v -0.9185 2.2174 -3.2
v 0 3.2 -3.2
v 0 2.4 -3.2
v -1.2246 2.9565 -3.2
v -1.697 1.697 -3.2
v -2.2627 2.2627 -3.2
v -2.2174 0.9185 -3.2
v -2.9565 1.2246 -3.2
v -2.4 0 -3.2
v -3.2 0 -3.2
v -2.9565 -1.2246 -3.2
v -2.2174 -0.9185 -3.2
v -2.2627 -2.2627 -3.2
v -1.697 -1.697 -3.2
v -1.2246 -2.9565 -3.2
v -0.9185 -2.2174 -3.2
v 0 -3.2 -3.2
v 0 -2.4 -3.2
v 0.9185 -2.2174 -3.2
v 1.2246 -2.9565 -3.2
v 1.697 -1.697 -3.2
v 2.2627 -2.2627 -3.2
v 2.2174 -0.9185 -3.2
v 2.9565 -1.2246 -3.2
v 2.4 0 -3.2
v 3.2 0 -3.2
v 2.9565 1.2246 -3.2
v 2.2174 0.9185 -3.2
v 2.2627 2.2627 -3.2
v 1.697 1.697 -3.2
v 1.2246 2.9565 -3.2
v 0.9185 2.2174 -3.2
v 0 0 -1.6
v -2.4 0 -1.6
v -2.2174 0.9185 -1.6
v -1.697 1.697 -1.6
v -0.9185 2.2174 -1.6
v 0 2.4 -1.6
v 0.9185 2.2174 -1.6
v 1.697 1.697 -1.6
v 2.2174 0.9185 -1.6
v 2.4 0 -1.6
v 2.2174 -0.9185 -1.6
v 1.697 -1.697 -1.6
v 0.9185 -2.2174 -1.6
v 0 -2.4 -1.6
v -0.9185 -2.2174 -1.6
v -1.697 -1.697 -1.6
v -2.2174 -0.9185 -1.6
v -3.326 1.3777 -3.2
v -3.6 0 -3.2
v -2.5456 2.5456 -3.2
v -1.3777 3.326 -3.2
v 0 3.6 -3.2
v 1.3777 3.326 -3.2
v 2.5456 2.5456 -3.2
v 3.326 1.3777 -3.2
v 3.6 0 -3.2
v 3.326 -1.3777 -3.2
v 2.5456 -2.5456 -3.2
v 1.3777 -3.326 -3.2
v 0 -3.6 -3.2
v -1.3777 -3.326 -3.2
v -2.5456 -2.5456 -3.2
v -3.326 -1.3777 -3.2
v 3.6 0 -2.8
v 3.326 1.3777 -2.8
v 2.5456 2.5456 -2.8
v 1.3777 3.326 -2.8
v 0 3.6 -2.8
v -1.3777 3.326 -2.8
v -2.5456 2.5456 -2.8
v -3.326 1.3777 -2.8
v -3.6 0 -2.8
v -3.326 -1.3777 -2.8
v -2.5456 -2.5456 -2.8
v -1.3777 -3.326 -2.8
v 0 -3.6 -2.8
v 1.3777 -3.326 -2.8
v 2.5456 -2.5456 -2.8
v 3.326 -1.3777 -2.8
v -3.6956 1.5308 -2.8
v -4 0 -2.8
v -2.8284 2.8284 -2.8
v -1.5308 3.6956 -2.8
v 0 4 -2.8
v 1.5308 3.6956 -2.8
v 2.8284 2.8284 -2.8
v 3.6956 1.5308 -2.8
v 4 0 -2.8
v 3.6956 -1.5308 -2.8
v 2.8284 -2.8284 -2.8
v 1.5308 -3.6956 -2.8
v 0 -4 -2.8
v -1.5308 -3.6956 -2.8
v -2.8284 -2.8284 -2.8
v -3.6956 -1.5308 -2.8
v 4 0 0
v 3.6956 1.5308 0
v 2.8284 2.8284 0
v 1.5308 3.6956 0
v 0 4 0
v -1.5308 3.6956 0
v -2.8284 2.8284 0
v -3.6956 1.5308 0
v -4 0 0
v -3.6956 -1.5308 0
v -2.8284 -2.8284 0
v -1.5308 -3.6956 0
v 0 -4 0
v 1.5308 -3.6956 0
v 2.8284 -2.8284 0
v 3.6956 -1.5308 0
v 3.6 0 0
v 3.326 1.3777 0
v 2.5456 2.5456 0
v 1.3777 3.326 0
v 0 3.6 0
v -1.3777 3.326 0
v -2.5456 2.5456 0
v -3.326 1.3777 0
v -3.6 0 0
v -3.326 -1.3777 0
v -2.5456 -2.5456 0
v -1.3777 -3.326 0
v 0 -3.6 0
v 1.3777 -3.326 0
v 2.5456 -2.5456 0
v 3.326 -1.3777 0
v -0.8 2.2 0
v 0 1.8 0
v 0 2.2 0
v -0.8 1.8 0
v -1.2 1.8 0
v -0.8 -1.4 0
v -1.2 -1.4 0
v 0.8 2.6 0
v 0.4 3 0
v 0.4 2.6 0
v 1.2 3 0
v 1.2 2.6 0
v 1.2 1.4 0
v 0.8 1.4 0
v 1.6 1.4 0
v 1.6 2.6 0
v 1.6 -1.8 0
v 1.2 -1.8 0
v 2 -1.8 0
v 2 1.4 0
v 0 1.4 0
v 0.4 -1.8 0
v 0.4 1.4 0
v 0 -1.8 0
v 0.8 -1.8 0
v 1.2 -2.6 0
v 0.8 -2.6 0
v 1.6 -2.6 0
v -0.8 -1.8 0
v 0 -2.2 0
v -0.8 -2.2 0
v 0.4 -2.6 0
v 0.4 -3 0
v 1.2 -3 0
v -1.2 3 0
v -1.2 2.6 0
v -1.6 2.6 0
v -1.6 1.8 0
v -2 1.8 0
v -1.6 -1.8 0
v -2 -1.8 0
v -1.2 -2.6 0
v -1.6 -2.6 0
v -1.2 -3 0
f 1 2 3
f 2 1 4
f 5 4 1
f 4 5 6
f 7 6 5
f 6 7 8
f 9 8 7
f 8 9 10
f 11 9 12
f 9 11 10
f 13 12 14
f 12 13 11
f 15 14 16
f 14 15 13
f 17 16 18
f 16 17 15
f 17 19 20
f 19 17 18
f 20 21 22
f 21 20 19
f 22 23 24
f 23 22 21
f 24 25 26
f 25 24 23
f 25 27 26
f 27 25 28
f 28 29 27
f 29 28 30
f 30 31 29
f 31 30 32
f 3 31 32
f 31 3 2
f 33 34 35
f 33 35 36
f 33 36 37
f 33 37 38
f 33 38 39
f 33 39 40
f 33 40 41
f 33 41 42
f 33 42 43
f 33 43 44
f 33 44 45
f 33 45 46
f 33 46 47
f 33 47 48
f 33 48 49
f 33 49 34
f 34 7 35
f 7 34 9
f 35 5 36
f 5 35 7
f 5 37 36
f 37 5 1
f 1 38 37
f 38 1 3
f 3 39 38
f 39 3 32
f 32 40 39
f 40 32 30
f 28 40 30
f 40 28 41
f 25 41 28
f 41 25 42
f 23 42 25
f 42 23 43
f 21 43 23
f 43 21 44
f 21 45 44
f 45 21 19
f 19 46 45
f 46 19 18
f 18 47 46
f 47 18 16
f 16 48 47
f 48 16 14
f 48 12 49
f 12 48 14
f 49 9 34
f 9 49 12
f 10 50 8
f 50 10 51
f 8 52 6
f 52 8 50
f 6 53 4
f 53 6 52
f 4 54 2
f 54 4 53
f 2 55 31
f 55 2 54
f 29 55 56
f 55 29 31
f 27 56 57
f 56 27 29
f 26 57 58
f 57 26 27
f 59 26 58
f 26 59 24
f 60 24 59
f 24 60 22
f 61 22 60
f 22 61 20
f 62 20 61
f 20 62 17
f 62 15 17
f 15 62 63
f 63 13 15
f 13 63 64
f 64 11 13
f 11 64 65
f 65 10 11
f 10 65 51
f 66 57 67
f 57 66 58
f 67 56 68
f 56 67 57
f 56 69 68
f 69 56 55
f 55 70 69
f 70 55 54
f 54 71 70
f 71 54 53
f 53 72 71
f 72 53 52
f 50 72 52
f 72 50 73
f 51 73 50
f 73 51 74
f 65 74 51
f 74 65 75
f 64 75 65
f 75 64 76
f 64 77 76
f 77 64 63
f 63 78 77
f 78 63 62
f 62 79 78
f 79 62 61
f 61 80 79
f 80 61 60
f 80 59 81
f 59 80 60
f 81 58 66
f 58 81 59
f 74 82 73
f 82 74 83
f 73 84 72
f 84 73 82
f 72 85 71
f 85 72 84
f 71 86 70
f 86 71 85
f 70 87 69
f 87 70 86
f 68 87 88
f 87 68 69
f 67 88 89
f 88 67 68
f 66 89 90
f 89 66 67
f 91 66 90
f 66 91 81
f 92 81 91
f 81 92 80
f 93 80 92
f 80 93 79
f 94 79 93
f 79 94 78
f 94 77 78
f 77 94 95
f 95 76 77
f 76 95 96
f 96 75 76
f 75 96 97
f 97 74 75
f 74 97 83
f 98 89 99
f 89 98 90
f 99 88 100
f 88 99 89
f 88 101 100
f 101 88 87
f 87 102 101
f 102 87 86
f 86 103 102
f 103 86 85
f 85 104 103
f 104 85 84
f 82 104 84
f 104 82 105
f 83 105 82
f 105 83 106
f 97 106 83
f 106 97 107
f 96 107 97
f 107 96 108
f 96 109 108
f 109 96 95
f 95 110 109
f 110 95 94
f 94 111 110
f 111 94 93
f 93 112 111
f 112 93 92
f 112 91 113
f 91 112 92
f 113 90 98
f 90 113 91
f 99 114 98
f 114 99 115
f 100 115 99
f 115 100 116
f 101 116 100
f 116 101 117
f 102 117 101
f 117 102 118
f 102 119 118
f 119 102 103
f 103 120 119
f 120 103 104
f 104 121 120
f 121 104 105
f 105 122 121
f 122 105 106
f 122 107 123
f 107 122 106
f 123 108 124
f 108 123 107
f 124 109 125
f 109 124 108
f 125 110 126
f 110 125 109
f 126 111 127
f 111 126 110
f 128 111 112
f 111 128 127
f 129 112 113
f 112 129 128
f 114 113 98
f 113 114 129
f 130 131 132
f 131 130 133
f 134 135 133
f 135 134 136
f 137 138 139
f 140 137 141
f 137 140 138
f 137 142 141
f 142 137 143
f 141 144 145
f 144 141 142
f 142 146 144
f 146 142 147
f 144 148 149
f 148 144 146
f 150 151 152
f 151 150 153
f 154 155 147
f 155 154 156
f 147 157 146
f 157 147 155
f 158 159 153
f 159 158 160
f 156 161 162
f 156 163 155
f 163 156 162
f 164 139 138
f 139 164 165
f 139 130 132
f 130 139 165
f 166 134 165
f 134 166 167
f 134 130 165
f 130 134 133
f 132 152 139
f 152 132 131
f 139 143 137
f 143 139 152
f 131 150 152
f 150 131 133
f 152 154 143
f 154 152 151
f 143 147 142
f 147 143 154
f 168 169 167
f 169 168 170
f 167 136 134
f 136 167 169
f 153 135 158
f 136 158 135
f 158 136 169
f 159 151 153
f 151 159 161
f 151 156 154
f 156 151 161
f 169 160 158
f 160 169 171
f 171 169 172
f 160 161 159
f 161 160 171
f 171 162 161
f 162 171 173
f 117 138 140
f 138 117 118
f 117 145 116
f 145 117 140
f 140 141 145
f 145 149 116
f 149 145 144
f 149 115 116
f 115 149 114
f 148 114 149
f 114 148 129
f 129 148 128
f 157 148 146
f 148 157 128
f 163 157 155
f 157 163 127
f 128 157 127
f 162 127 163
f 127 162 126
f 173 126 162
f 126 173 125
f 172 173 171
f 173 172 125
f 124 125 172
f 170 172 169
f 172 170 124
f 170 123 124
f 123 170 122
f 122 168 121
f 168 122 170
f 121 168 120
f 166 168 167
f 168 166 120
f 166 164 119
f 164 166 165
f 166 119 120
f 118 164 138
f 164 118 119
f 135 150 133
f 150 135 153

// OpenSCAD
// file: ../p/4-4disc.scad
use <../lib.scad>
function ldraw_lib__4_4disc() = [
// 0 Disc 1.0
// 0 Name: 4-4disc.dat
// 0 Author: James Jessiman
// 0 !LDRAW_ORG Primitive UPDATE 2002-02
// 0 !LICENSE Licensed under CC BY 4.0 : see CAreadme.txt
// 
// 0 BFC CERTIFY CCW
  [0,"BFC","CERTIFY"],
  [0,"BFC","CCW"],
// 
// 0 !HISTORY 1998-12-15 [PTadmin] Official Update 1998-10
// 0 !HISTORY 2002-03-23 [sbliss] Added BFC statement
// 0 !HISTORY 2002-04-25 [PTadmin] Official Update 2002-02
// 0 !HISTORY 2007-06-24 [PTadmin] Header formatted for Contributor Agreement
// 0 !HISTORY 2008-07-01 [PTadmin] Official Update 2008-01
// 
// 
// 3 16 0 0 0 1 0 0 0.9239 0 0.3827
  [3,16,0,0,0,1,0,0,0.9239,0,0.3827],
// 3 16 0 0 0 0.9239 0 0.3827 0.7071 0 0.7071
  [3,16,0,0,0,0.9239,0,0.3827,0.7071,0,0.7071],
// 3 16 0 0 0 0.7071 0 0.7071 0.3827 0 0.9239
  [3,16,0,0,0,0.7071,0,0.7071,0.3827,0,0.9239],
// 3 16 0 0 0 0.3827 0 0.9239 0 0 1
  [3,16,0,0,0,0.3827,0,0.9239,0,0,1],
// 3 16 0 0 0 0 0 1 -0.3827 0 0.9239
  [3,16,0,0,0,0,0,1,-0.3827,0,0.9239],
// 3 16 0 0 0 -0.3827 0 0.9239 -0.7071 0 0.7071
  [3,16,0,0,0,-0.3827,0,0.9239,-0.7071,0,0.7071],
// 3 16 0 0 0 -0.7071 0 0.7071 -0.9239 0 0.3827
  [3,16,0,0,0,-0.7071,0,0.7071,-0.9239,0,0.3827],
// 3 16 0 0 0 -0.9239 0 0.3827 -1 0 -0
  [3,16,0,0,0,-0.9239,0,0.3827,-1,0,-0],
// 3 16 0 0 0 -1 0 -0 -0.9239 0 -0.3827
  [3,16,0,0,0,-1,0,-0,-0.9239,0,-0.3827],
// 3 16 0 0 0 -0.9239 0 -0.3827 -0.7071 0 -0.7071
  [3,16,0,0,0,-0.9239,0,-0.3827,-0.7071,0,-0.7071],
// 3 16 0 0 0 -0.7071 0 -0.7071 -0.3827 0 -0.9239
  [3,16,0,0,0,-0.7071,0,-0.7071,-0.3827,0,-0.9239],
// 3 16 0 0 0 -0.3827 0 -0.9239 0 0 -1
  [3,16,0,0,0,-0.3827,0,-0.9239,0,0,-1],
// 3 16 0 0 0 0 0 -1 0.3827 0 -0.9239
  [3,16,0,0,0,0,0,-1,0.3827,0,-0.9239],
// 3 16 0 0 0 0.3827 0 -0.9239 0.7071 0 -0.7071
  [3,16,0,0,0,0.3827,0,-0.9239,0.7071,0,-0.7071],
// 3 16 0 0 0 0.7071 0 -0.7071 0.9239 0 -0.3827
  [3,16,0,0,0,0.7071,0,-0.7071,0.9239,0,-0.3827],
// 3 16 0 0 0 0.9239 0 -0.3827 1 0 0
  [3,16,0,0,0,0.9239,0,-0.3827,1,0,0],
// 0
];
module ldraw_lib__4_4disc(step=0, col=false, unit=2/5, alt=false, line=0.2, solid=!$preview)
    makepoly(ldraw_lib__4_4disc(), step=step, col=col, unit=unit, alt=alt, line=line, solid=solid);
ldraw_lib__4_4disc(line=0.2);
// file: ../p/4-4ring3.scad
use <../lib.scad>
function ldraw_lib__4_4ring3() = [
// 0 Ring  3 x 1.0
// 0 Name: 4-4ring3.dat
// 0 Author: James Jessiman
// 0 !LDRAW_ORG Primitive UPDATE 2009-01
// 0 !LICENSE Licensed under CC BY 4.0 : see CAreadme.txt
// 
// 0 BFC CERTIFY CCW
  [0,"BFC","CERTIFY"],
  [0,"BFC","CCW"],
// 
// 0 !HISTORY 1998-12-15 [PTadmin] Official Update 1998-10
// 0 !HISTORY 2002-04-05 [hafhead] Added BFC statement
// 0 !HISTORY 2002-04-25 [PTadmin] Official Update 2002-02
// 0 !HISTORY 2007-06-24 [PTadmin] Header formatted for Contributor Agreement
// 0 !HISTORY 2008-07-01 [PTadmin] Official Update 2008-01
// 0 !HISTORY 2008-08-26 [cwdee] Switch polygon winding and rename
// 0 !HISTORY 2009-05-02 [PTadmin] Official Update 2009-01
// 
// 
// 4 16 -1.5308 0 3.6956 -1.1481 0 2.7717 0 0 3 0 0 4
  [4,16,-1.5308,0,3.6956,-1.1481,0,2.7717,0,0,3,0,0,4],
// 4 16 -2.8284 0 2.8284 -2.1213 0 2.1213 -1.1481 0 2.7717 -1.5308 0 3.6956
  [4,16,-2.8284,0,2.8284,-2.1213,0,2.1213,-1.1481,0,2.7717,-1.5308,0,3.6956],
// 4 16 -3.6956 0 1.5308 -2.7717 0 1.1481 -2.1213 0 2.1213 -2.8284 0 2.8284
  [4,16,-3.6956,0,1.5308,-2.7717,0,1.1481,-2.1213,0,2.1213,-2.8284,0,2.8284],
// 4 16 -4 0 0 -3 0 0 -2.7717 0 1.1481 -3.6956 0 1.5308
  [4,16,-4,0,0,-3,0,0,-2.7717,0,1.1481,-3.6956,0,1.5308],
// 4 16 -3.6956 0 -1.5308 -2.7717 0 -1.1481 -3 0 0 -4 0 0
  [4,16,-3.6956,0,-1.5308,-2.7717,0,-1.1481,-3,0,0,-4,0,0],
// 4 16 -2.8284 0 -2.8284 -2.1213 0 -2.1213 -2.7717 0 -1.1481 -3.6956 0 -1.5308
  [4,16,-2.8284,0,-2.8284,-2.1213,0,-2.1213,-2.7717,0,-1.1481,-3.6956,0,-1.5308],
// 4 16 -1.5308 0 -3.6956 -1.1481 0 -2.7717 -2.1213 0 -2.1213 -2.8284 0 -2.8284
  [4,16,-1.5308,0,-3.6956,-1.1481,0,-2.7717,-2.1213,0,-2.1213,-2.8284,0,-2.8284],
// 4 16 0 0 -4 0 0 -3 -1.1481 0 -2.7717 -1.5308 0 -3.6956
  [4,16,0,0,-4,0,0,-3,-1.1481,0,-2.7717,-1.5308,0,-3.6956],
// 4 16 1.5308 0 -3.6956 1.1481 0 -2.7717 0 0 -3 0 0 -4
  [4,16,1.5308,0,-3.6956,1.1481,0,-2.7717,0,0,-3,0,0,-4],
// 4 16 2.8284 0 -2.8284 2.1213 0 -2.1213 1.1481 0 -2.7717 1.5308 0 -3.6956
  [4,16,2.8284,0,-2.8284,2.1213,0,-2.1213,1.1481,0,-2.7717,1.5308,0,-3.6956],
// 4 16 3.6956 0 -1.5308 2.7717 0 -1.1481 2.1213 0 -2.1213 2.8284 0 -2.8284
  [4,16,3.6956,0,-1.5308,2.7717,0,-1.1481,2.1213,0,-2.1213,2.8284,0,-2.8284],
// 4 16 4 0 0 3 0 0 2.7717 0 -1.1481 3.6956 0 -1.5308
  [4,16,4,0,0,3,0,0,2.7717,0,-1.1481,3.6956,0,-1.5308],
// 4 16 3.6956 0 1.5308 2.7717 0 1.1481 3 0 0 4 0 0
  [4,16,3.6956,0,1.5308,2.7717,0,1.1481,3,0,0,4,0,0],
// 4 16 2.8284 0 2.8284 2.1213 0 2.1213 2.7717 0 1.1481 3.6956 0 1.5308
  [4,16,2.8284,0,2.8284,2.1213,0,2.1213,2.7717,0,1.1481,3.6956,0,1.5308],
// 4 16 1.5308 0 3.6956 1.1481 0 2.7717 2.1213 0 2.1213 2.8284 0 2.8284
  [4,16,1.5308,0,3.6956,1.1481,0,2.7717,2.1213,0,2.1213,2.8284,0,2.8284],
// 4 16 0 0 4 0 0 3 1.1481 0 2.7717 1.5308 0 3.6956
  [4,16,0,0,4,0,0,3,1.1481,0,2.7717,1.5308,0,3.6956],
// 0
];
module ldraw_lib__4_4ring3(step=0, col=false, unit=2/5, alt=false, line=0.2, solid=!$preview)
    makepoly(ldraw_lib__4_4ring3(), step=step, col=col, unit=unit, alt=alt, line=line, solid=solid);
ldraw_lib__4_4ring3(line=0.2);
// file: ../p/4-4cylc.scad
use <../lib.scad>
use <4-4cyli.scad>
use <4-4disc.scad>
use <4-4edge.scad>
function ldraw_lib__4_4cylc() = [
// 0 Cylinder Closed 1.0
// 0 Name: 4-4cylc.dat
// 0 Author: Alex Taylor [anathema]
// 0 !LDRAW_ORG Primitive UPDATE 2009-02
// 0 !LICENSE Licensed under CC BY 4.0 : see CAreadme.txt
// 
// 0 BFC CERTIFY CCW
  [0,"BFC","CERTIFY"],
  [0,"BFC","CCW"],
// 
// 0 !HISTORY 2008-12-29 [cwdee] Removed one disc
// 0 !HISTORY 2009-09-03 [PTadmin] Official Update 2009-02
// 
// 
// 1 16 0 0 0 1 0 0 0 1 0 0 0 1 4-4edge.dat
  [1,16,0,0,0,1,0,0,0,1,0,0,0,1, ldraw_lib__4_4edge()],
// 1 16 0 1 0 1 0 0 0 1 0 0 0 1 4-4edge.dat
  [1,16,0,1,0,1,0,0,0,1,0,0,0,1, ldraw_lib__4_4edge()],
// 1 16 0 0 0 1 0 0 0 1 0 0 0 1 4-4disc.dat
  [1,16,0,0,0,1,0,0,0,1,0,0,0,1, ldraw_lib__4_4disc()],
// 1 16 0 0 0 1 0 0 0 1 0 0 0 1 4-4cyli.dat
  [1,16,0,0,0,1,0,0,0,1,0,0,0,1, ldraw_lib__4_4cyli()],
// 0
];
module ldraw_lib__4_4cylc(step=0, col=false, unit=2/5, alt=false, line=0.2, solid=!$preview)
    makepoly(ldraw_lib__4_4cylc(), step=step, col=col, unit=unit, alt=alt, line=line, solid=solid);
ldraw_lib__4_4cylc(line=0.2);
// file: ../p/4-4edge.scad
use <../lib.scad>
function ldraw_lib__4_4edge() = [
// 0 Circle 1.0
// 0 Name: 4-4edge.dat
// 0 Author: James Jessiman
// 0 !LDRAW_ORG Primitive UPDATE 2017-01
// 0 !LICENSE Licensed under CC BY 4.0 : see CAreadme.txt
// 
// 0 BFC CERTIFY CCW
  [0,"BFC","CERTIFY"],
  [0,"BFC","CCW"],
// 
// 0 !HISTORY 1998-12-15 [PTadmin] Official Update 1998-10
// 0 !HISTORY 2005-12-28 [PTadmin] Official Update 2005-01
// 0 !HISTORY 2007-06-24 [PTadmin] Header formatted for Contributor Agreement
// 0 !HISTORY 2008-07-01 [PTadmin] Official Update 2008-01
// 0 !HISTORY 2017-01-15 [Steffen] BFCed
// 0 !HISTORY 2017-12-30 [PTadmin] Official Update 2017-01
// 
// 
// 2 24 1 0 0 0.9239 0 0.3827
  [2,24,1,0,0,0.9239,0,0.3827],
// 2 24 0.9239 0 0.3827 0.7071 0 0.7071
  [2,24,0.9239,0,0.3827,0.7071,0,0.7071],
// 2 24 0.7071 0 0.7071 0.3827 0 0.9239
  [2,24,0.7071,0,0.7071,0.3827,0,0.9239],
// 2 24 0.3827 0 0.9239 0 0 1
  [2,24,0.3827,0,0.9239,0,0,1],
// 2 24 0 0 1 -0.3827 0 0.9239
  [2,24,0,0,1,-0.3827,0,0.9239],
// 2 24 -0.3827 0 0.9239 -0.7071 0 0.7071
  [2,24,-0.3827,0,0.9239,-0.7071,0,0.7071],
// 2 24 -0.7071 0 0.7071 -0.9239 0 0.3827
  [2,24,-0.7071,0,0.7071,-0.9239,0,0.3827],
// 2 24 -0.9239 0 0.3827 -1 0 -0
  [2,24,-0.9239,0,0.3827,-1,0,-0],
// 2 24 -1 0 -0 -0.9239 0 -0.3827
  [2,24,-1,0,-0,-0.9239,0,-0.3827],
// 2 24 -0.9239 0 -0.3827 -0.7071 0 -0.7071
  [2,24,-0.9239,0,-0.3827,-0.7071,0,-0.7071],
// 2 24 -0.7071 0 -0.7071 -0.3827 0 -0.9239
  [2,24,-0.7071,0,-0.7071,-0.3827,0,-0.9239],
// 2 24 -0.3827 0 -0.9239 0 0 -1
  [2,24,-0.3827,0,-0.9239,0,0,-1],
// 2 24 0 0 -1 0.3827 0 -0.9239
  [2,24,0,0,-1,0.3827,0,-0.9239],
// 2 24 0.3827 0 -0.9239 0.7071 0 -0.7071
  [2,24,0.3827,0,-0.9239,0.7071,0,-0.7071],
// 2 24 0.7071 0 -0.7071 0.9239 0 -0.3827
  [2,24,0.7071,0,-0.7071,0.9239,0,-0.3827],
// 2 24 0.9239 0 -0.3827 1 0 0
  [2,24,0.9239,0,-0.3827,1,0,0],
];
module ldraw_lib__4_4edge(step=0, col=false, unit=2/5, alt=false, line=0.2, solid=!$preview)
    makepoly(ldraw_lib__4_4edge(), step=step, col=col, unit=unit, alt=alt, line=line, solid=solid);
ldraw_lib__4_4edge(line=0.2);
// file: ../p/4-4cyli.scad
use <../lib.scad>
function ldraw_lib__4_4cyli() = [
// 0 Cylinder 1.0
// 0 Name: 4-4cyli.dat
// 0 Author: James Jessiman
// 0 !LDRAW_ORG Primitive UPDATE 2005-01
// 0 !LICENSE Licensed under CC BY 4.0 : see CAreadme.txt
// 
// 0 BFC CERTIFY CCW
  [0,"BFC","CERTIFY"],
  [0,"BFC","CCW"],
// 
// 0 !HISTORY 1998-12-15 [PTadmin] Official Update 1998-10
// 0 !HISTORY 2002-03-23 [sbliss] Added BFC statement; merged headers from files in distributions LDraw 0.27 and Complete.
// 0 !HISTORY 2002-04-25 [PTadmin] Official Update 2002-02
// 0 !HISTORY 2004-12-14 [guyvivan] BFC CCW
// 0 !HISTORY 2005-12-28 [PTadmin] Official Update 2005-01
// 0 !HISTORY 2007-06-24 [PTadmin] Header formatted for Contributor Agreement
// 0 !HISTORY 2008-07-01 [PTadmin] Official Update 2008-01
// 
// 
// 4 16 1 1 0 0.9239 1 0.3827 0.9239 0 0.3827 1 0 0
  [4,16,1,1,0,0.9239,1,0.3827,0.9239,0,0.3827,1,0,0],
// 5 24 1 0 0 1 1 0 0.9239 0 0.3827 0.9239 0 -0.3827
  [5,24,1,0,0,1,1,0,0.9239,0,0.3827,0.9239,0,-0.3827],
// 4 16 0.9239 1 0.3827 0.7071 1 0.7071 0.7071 0 0.7071 0.9239 0 0.3827
  [4,16,0.9239,1,0.3827,0.7071,1,0.7071,0.7071,0,0.7071,0.9239,0,0.3827],
// 5 24 0.9239 0 0.3827 0.9239 1 0.3827 0.7071 0 0.7071 1 0 0
  [5,24,0.9239,0,0.3827,0.9239,1,0.3827,0.7071,0,0.7071,1,0,0],
// 4 16 0.7071 1 0.7071 0.3827 1 0.9239 0.3827 0 0.9239 0.7071 0 0.7071
  [4,16,0.7071,1,0.7071,0.3827,1,0.9239,0.3827,0,0.9239,0.7071,0,0.7071],
// 5 24 0.7071 0 0.7071 0.7071 1 0.7071 0.3827 0 0.9239 0.9239 0 0.3827
  [5,24,0.7071,0,0.7071,0.7071,1,0.7071,0.3827,0,0.9239,0.9239,0,0.3827],
// 4 16 0.3827 1 0.9239 0 1 1 0 0 1 0.3827 0 0.9239
  [4,16,0.3827,1,0.9239,0,1,1,0,0,1,0.3827,0,0.9239],
// 5 24 0.3827 0 0.9239 0.3827 1 0.9239 0 0 1 0.7071 0 0.7071
  [5,24,0.3827,0,0.9239,0.3827,1,0.9239,0,0,1,0.7071,0,0.7071],
// 4 16 0 1 1 -0.3827 1 0.9239 -0.3827 0 0.9239 0 0 1
  [4,16,0,1,1,-0.3827,1,0.9239,-0.3827,0,0.9239,0,0,1],
// 5 24 0 0 1 0 1 1 -0.3827 0 0.9239 0.3827 0 0.9239
  [5,24,0,0,1,0,1,1,-0.3827,0,0.9239,0.3827,0,0.9239],
// 4 16 -0.3827 1 0.9239 -0.7071 1 0.7071 -0.7071 0 0.7071 -0.3827 0 0.9239
  [4,16,-0.3827,1,0.9239,-0.7071,1,0.7071,-0.7071,0,0.7071,-0.3827,0,0.9239],
// 5 24 -0.3827 0 0.9239 -0.3827 1 0.9239 -0.7071 0 0.7071 0 0 1
  [5,24,-0.3827,0,0.9239,-0.3827,1,0.9239,-0.7071,0,0.7071,0,0,1],
// 4 16 -0.7071 1 0.7071 -0.9239 1 0.3827 -0.9239 0 0.3827 -0.7071 0 0.7071
  [4,16,-0.7071,1,0.7071,-0.9239,1,0.3827,-0.9239,0,0.3827,-0.7071,0,0.7071],
// 5 24 -0.7071 0 0.7071 -0.7071 1 0.7071 -0.9239 0 0.3827 -0.3827 0 0.9239
  [5,24,-0.7071,0,0.7071,-0.7071,1,0.7071,-0.9239,0,0.3827,-0.3827,0,0.9239],
// 4 16 -0.9239 1 0.3827 -1 1 0 -1 0 0 -0.9239 0 0.3827
  [4,16,-0.9239,1,0.3827,-1,1,0,-1,0,0,-0.9239,0,0.3827],
// 5 24 -0.9239 0 0.3827 -0.9239 1 0.3827 -1 0 0 -0.7071 0 0.7071
  [5,24,-0.9239,0,0.3827,-0.9239,1,0.3827,-1,0,0,-0.7071,0,0.7071],
// 4 16 -1 1 0 -0.9239 1 -0.3827 -0.9239 0 -0.3827 -1 0 0
  [4,16,-1,1,0,-0.9239,1,-0.3827,-0.9239,0,-0.3827,-1,0,0],
// 5 24 -1 0 0 -1 1 0 -0.9239 0 -0.3827 -0.9239 0 0.3827
  [5,24,-1,0,0,-1,1,0,-0.9239,0,-0.3827,-0.9239,0,0.3827],
// 4 16 -0.9239 1 -0.3827 -0.7071 1 -0.7071 -0.7071 0 -0.7071 -0.9239 0 -0.3827
  [4,16,-0.9239,1,-0.3827,-0.7071,1,-0.7071,-0.7071,0,-0.7071,-0.9239,0,-0.3827],
// 5 24 -0.9239 0 -0.3827 -0.9239 1 -0.3827 -0.7071 0 -0.7071 -1 0 0
  [5,24,-0.9239,0,-0.3827,-0.9239,1,-0.3827,-0.7071,0,-0.7071,-1,0,0],
// 4 16 -0.7071 1 -0.7071 -0.3827 1 -0.9239 -0.3827 0 -0.9239 -0.7071 0 -0.7071
  [4,16,-0.7071,1,-0.7071,-0.3827,1,-0.9239,-0.3827,0,-0.9239,-0.7071,0,-0.7071],
// 5 24 -0.7071 0 -0.7071 -0.7071 1 -0.7071 -0.3827 0 -0.9239 -0.9239 0 -0.3827
  [5,24,-0.7071,0,-0.7071,-0.7071,1,-0.7071,-0.3827,0,-0.9239,-0.9239,0,-0.3827],
// 4 16 -0.3827 1 -0.9239 0 1 -1 0 0 -1 -0.3827 0 -0.9239
  [4,16,-0.3827,1,-0.9239,0,1,-1,0,0,-1,-0.3827,0,-0.9239],
// 5 24 -0.3827 0 -0.9239 -0.3827 1 -0.9239 0 0 -1 -0.7071 0 -0.7071
  [5,24,-0.3827,0,-0.9239,-0.3827,1,-0.9239,0,0,-1,-0.7071,0,-0.7071],
// 4 16 0 1 -1 0.3827 1 -0.9239 0.3827 0 -0.9239 0 0 -1
  [4,16,0,1,-1,0.3827,1,-0.9239,0.3827,0,-0.9239,0,0,-1],
// 5 24 0 0 -1 0 1 -1 0.3827 0 -0.9239 -0.3827 0 -0.9239
  [5,24,0,0,-1,0,1,-1,0.3827,0,-0.9239,-0.3827,0,-0.9239],
// 4 16 0.3827 1 -0.9239 0.7071 1 -0.7071 0.7071 0 -0.7071 0.3827 0 -0.9239
  [4,16,0.3827,1,-0.9239,0.7071,1,-0.7071,0.7071,0,-0.7071,0.3827,0,-0.9239],
// 5 24 0.3827 0 -0.9239 0.3827 1 -0.9239 0.7071 0 -0.7071 0 0 -1
  [5,24,0.3827,0,-0.9239,0.3827,1,-0.9239,0.7071,0,-0.7071,0,0,-1],
// 4 16 0.7071 1 -0.7071 0.9239 1 -0.3827 0.9239 0 -0.3827 0.7071 0 -0.7071
  [4,16,0.7071,1,-0.7071,0.9239,1,-0.3827,0.9239,0,-0.3827,0.7071,0,-0.7071],
// 5 24 0.7071 0 -0.7071 0.7071 1 -0.7071 0.9239 0 -0.3827 0.3827 0 -0.9239
  [5,24,0.7071,0,-0.7071,0.7071,1,-0.7071,0.9239,0,-0.3827,0.3827,0,-0.9239],
// 4 16 0.9239 1 -0.3827 1 1 0 1 0 0 0.9239 0 -0.3827
  [4,16,0.9239,1,-0.3827,1,1,0,1,0,0,0.9239,0,-0.3827],
// 5 24 0.9239 0 -0.3827 0.9239 1 -0.3827 1 0 0 0.7071 0 -0.7071
  [5,24,0.9239,0,-0.3827,0.9239,1,-0.3827,1,0,0,0.7071,0,-0.7071],
// 0
];
module ldraw_lib__4_4cyli(step=0, col=false, unit=2/5, alt=false, line=0.2, solid=!$preview)
    makepoly(ldraw_lib__4_4cyli(), step=step, col=col, unit=unit, alt=alt, line=line, solid=solid);
ldraw_lib__4_4cyli(line=0.2);
// file: ../p/stud4o.scad
use <../lib.scad>
use <4-4cylc.scad>
use <4-4ring3.scad>
function ldraw_lib__stud4o() = [
// 0 Stud Tube Open without Outer Cylinder
// 0 Name: stud4o.dat
// 0 Author: Magnus Forsberg [MagFors]
// 0 !LDRAW_ORG Primitive UPDATE 2011-02
// 0 !LICENSE Licensed under CC BY 4.0 : see CAreadme.txt
// 
// 0 !HELP This stud is a "antistud" to be used like a underside stud,
// 0 !HELP but without the outer cylinder.
// 0 !HELP 1 47 0 0 0 1 0 0 0 1 0 0 0 1 stud4.dat
// 
// 0 BFC CERTIFY CCW
  [0,"BFC","CERTIFY"],
  [0,"BFC","CCW"],
// 
// 0 !HISTORY 2011-12-29 [PTadmin] Official Update 2011-02
// 
// 
// 1 16 0 -4 0 2 0 0 0 1 0 0 0 2 4-4ring3.dat
  [1,16,0,-4,0,2,0,0,0,1,0,0,0,2, ldraw_lib__4_4ring3()],
// 0 BFC INVERTNEXT
  [0,"BFC","INVERTNEXT"],
// 1 16 0 0 0 -6 0 0 0 -4 0 0 0 6 4-4cylc.dat
  [1,16,0,0,0,-6,0,0,0,-4,0,0,0,6, ldraw_lib__4_4cylc()],
];
module ldraw_lib__stud4o(step=0, col=false, unit=2/5, alt=false, line=0.2, solid=!$preview)
    makepoly(ldraw_lib__stud4o(), step=step, col=col, unit=unit, alt=alt, line=line, solid=solid);
ldraw_lib__stud4o(line=0.2);
// file: ../p/4-4ring8.scad
use <../lib.scad>
function ldraw_lib__4_4ring8() = [
// 0 Ring  8 x 1.0
// 0 Name: 4-4ring8.dat
// 0 Author: Steffen [Steffen]
// 0 !LDRAW_ORG Primitive UPDATE 2012-01
// 0 !LICENSE Licensed under CC BY 4.0 : see CAreadme.txt
// 
// 0 BFC CERTIFY CCW
  [0,"BFC","CERTIFY"],
  [0,"BFC","CCW"],
// 
// 0 !HISTORY 2003-12-19 [PTadmin] Official Update 2003-03
// 0 !HISTORY 2007-06-24 [PTadmin] Header formatted for Contributor Agreement
// 0 !HISTORY 2008-07-01 [PTadmin] Official Update 2008-01
// 0 !HISTORY 2012-02-16 [Philo] Changed to CCW
// 0 !HISTORY 2012-03-30 [PTadmin] Official Update 2012-01
// 
// 
// 4 16 9 0 0 8.3151 0 3.4443 7.3912 0 3.0616 8 0 0
  [4,16,9,0,0,8.3151,0,3.4443,7.3912,0,3.0616,8,0,0],
// 4 16 8.3151 0 3.4443 6.3639 0 6.3639 5.6568 0 5.6568 7.3912 0 3.0616
  [4,16,8.3151,0,3.4443,6.3639,0,6.3639,5.6568,0,5.6568,7.3912,0,3.0616],
// 4 16 6.3639 0 6.3639 3.4443 0 8.3151 3.0616 0 7.3912 5.6568 0 5.6568
  [4,16,6.3639,0,6.3639,3.4443,0,8.3151,3.0616,0,7.3912,5.6568,0,5.6568],
// 4 16 3.4443 0 8.3151 0 0 9 0 0 8 3.0616 0 7.3912
  [4,16,3.4443,0,8.3151,0,0,9,0,0,8,3.0616,0,7.3912],
// 4 16 0 0 9 -3.4443 0 8.3151 -3.0616 0 7.3912 0 0 8
  [4,16,0,0,9,-3.4443,0,8.3151,-3.0616,0,7.3912,0,0,8],
// 4 16 -3.4443 0 8.3151 -6.3639 0 6.3639 -5.6568 0 5.6568 -3.0616 0 7.3912
  [4,16,-3.4443,0,8.3151,-6.3639,0,6.3639,-5.6568,0,5.6568,-3.0616,0,7.3912],
// 4 16 -6.3639 0 6.3639 -8.3151 0 3.4443 -7.3912 0 3.0616 -5.6568 0 5.6568
  [4,16,-6.3639,0,6.3639,-8.3151,0,3.4443,-7.3912,0,3.0616,-5.6568,0,5.6568],
// 4 16 -8.3151 0 3.4443 -9 0 0 -8 0 0 -7.3912 0 3.0616
  [4,16,-8.3151,0,3.4443,-9,0,0,-8,0,0,-7.3912,0,3.0616],
// 4 16 -9 0 0 -8.3151 0 -3.4443 -7.3912 0 -3.0616 -8 0 0
  [4,16,-9,0,0,-8.3151,0,-3.4443,-7.3912,0,-3.0616,-8,0,0],
// 4 16 -8.3151 0 -3.4443 -6.3639 0 -6.3639 -5.6568 0 -5.6568 -7.3912 0 -3.0616
  [4,16,-8.3151,0,-3.4443,-6.3639,0,-6.3639,-5.6568,0,-5.6568,-7.3912,0,-3.0616],
// 4 16 -6.3639 0 -6.3639 -3.4443 0 -8.3151 -3.0616 0 -7.3912 -5.6568 0 -5.6568
  [4,16,-6.3639,0,-6.3639,-3.4443,0,-8.3151,-3.0616,0,-7.3912,-5.6568,0,-5.6568],
// 4 16 -3.4443 0 -8.3151 0 0 -9 0 0 -8 -3.0616 0 -7.3912
  [4,16,-3.4443,0,-8.3151,0,0,-9,0,0,-8,-3.0616,0,-7.3912],
// 4 16 0 0 -9 3.4443 0 -8.3151 3.0616 0 -7.3912 0 0 -8
  [4,16,0,0,-9,3.4443,0,-8.3151,3.0616,0,-7.3912,0,0,-8],
// 4 16 3.4443 0 -8.3151 6.3639 0 -6.3639 5.6568 0 -5.6568 3.0616 0 -7.3912
  [4,16,3.4443,0,-8.3151,6.3639,0,-6.3639,5.6568,0,-5.6568,3.0616,0,-7.3912],
// 4 16 6.3639 0 -6.3639 8.3151 0 -3.4443 7.3912 0 -3.0616 5.6568 0 -5.6568
  [4,16,6.3639,0,-6.3639,8.3151,0,-3.4443,7.3912,0,-3.0616,5.6568,0,-5.6568],
// 4 16 8.3151 0 -3.4443 9 0 0 8 0 0 7.3912 0 -3.0616
  [4,16,8.3151,0,-3.4443,9,0,0,8,0,0,7.3912,0,-3.0616],
];
module ldraw_lib__4_4ring8(step=0, col=false, unit=2/5, alt=false, line=0.2, solid=!$preview)
    makepoly(ldraw_lib__4_4ring8(), step=step, col=col, unit=unit, alt=alt, line=line, solid=solid);
ldraw_lib__4_4ring8(line=0.2);
// file: ../p/4-4cylo.scad
use <../lib.scad>
use <4-4cyli.scad>
use <4-4edge.scad>
function ldraw_lib__4_4cylo() = [
// 0 Cylinder Open 1.0
// 0 Name: 4-4cylo.dat
// 0 Author: Mark Kennedy [mkennedy]
// 0 !LDRAW_ORG Primitive UPDATE 2010-01
// 0 !LICENSE Licensed under CC BY 4.0 : see CAreadme.txt
// 
// 0 BFC CERTIFY CCW
  [0,"BFC","CERTIFY"],
  [0,"BFC","CCW"],
// 
// 0 !HISTORY 2010-04-05 [PTadmin] Official Update 2010-01
// 
// 
// 1 16 0 0 0 1 0 0 0 1 0 0 0 1 4-4edge.dat
  [1,16,0,0,0,1,0,0,0,1,0,0,0,1, ldraw_lib__4_4edge()],
// 1 16 0 1 0 1 0 0 0 1 0 0 0 1 4-4edge.dat
  [1,16,0,1,0,1,0,0,0,1,0,0,0,1, ldraw_lib__4_4edge()],
// 1 16 0 0 0 1 0 0 0 1 0 0 0 1 4-4cyli.dat
  [1,16,0,0,0,1,0,0,0,1,0,0,0,1, ldraw_lib__4_4cyli()],
// 0
];
module ldraw_lib__4_4cylo(step=0, col=false, unit=2/5, alt=false, line=0.2, solid=!$preview)
    makepoly(ldraw_lib__4_4cylo(), step=step, col=col, unit=unit, alt=alt, line=line, solid=solid);
ldraw_lib__4_4cylo(line=0.2);
// file: ../p/empty.scad
use <../lib.scad>
function ldraw_lib__empty() = [
// 0 Empty
// 0 Name: empty.dat
// 0 Author: Steffen [Steffen]
// 0 !LDRAW_ORG Primitive UPDATE 2015-01
// 0 !LICENSE Licensed under CC BY 4.0 : see CAreadme.txt
// 
// 0 BFC CERTIFY CCW
  [0,"BFC","CERTIFY"],
  [0,"BFC","CCW"],
// 
// 0 !HISTORY 2015-10-11 [PTadmin] Official Update 2015-01
// 
// 
// 0 // Tool MLCad cannot handle really empty files. This file is used as a workaround.
// 0 // It exceptionally contains forbidden non-LDRAW standard syntax to satisfy MLCad until it is fixed OR a different editor has become the de-facto LDRAW standard.
// 0 // The line being used here is an "impossible" conditional line which never should be visible,
// 0 // additionally hidden by a syntax explicitly hiding it from displaying.
// 
// 0 MLCAD HIDE 5 24 0 0 0 0.0001 0 0 0.0001 -0.0001 0 0 0 0
];
module ldraw_lib__empty(step=0, col=false, unit=2/5, alt=false, line=0.2, solid=!$preview)
    makepoly(ldraw_lib__empty(), step=step, col=col, unit=unit, alt=alt, line=line, solid=solid);
ldraw_lib__empty(line=0.2);
// file: s/98138s02.scad
use <../../lib.scad>
use <../../p/4-4cylo.scad>
use <../../p/4-4ring8.scad>
use <../../p/4-4ring9.scad>
use <../../p/stud4o.scad>
function ldraw_lib__s__98138s02() = [
// 0 ~Tile  1 x  1 Round with Groove without Complete Top Face
// 0 Name: s\98138s02.dat
// 0 Author: Magnus Forsberg [MagFors]
// 0 !LDRAW_ORG Subpart UPDATE 2020-01
// 0 !LICENSE Licensed under CC BY 4.0 : see CAreadme.txt
// 
// 0 BFC CERTIFY CCW
  [0,"BFC","CERTIFY"],
  [0,"BFC","CCW"],
// 
// 0 !HISTORY 2020-06-28 [PTadmin] Official Update 2020-01
// 
// 
// 1 16 0 4 0 1 0 0 0 -1 0 0 0 1 stud4o.dat
  [1,16,0,4,0,1,0,0,0,-1,0,0,0,1, ldraw_lib__stud4o()],
// 1 16 0 8 0 -1 0 0 0 -1 0 0 0 1 4-4ring8.dat
  [1,16,0,8,0,-1,0,0,0,-1,0,0,0,1, ldraw_lib__4_4ring8()],
// 1 16 0 7 0 9 0 0 0 1 0 0 0 9 4-4cylo.dat
  [1,16,0,7,0,9,0,0,0,1,0,0,0,9, ldraw_lib__4_4cylo()],
// 1 16 0 7 0 -1 0 0 0 -1 0 0 0 1 4-4ring9.dat
  [1,16,0,7,0,-1,0,0,0,-1,0,0,0,1, ldraw_lib__4_4ring9()],
// 1 16 0 0 0 10 0 0 0 7 0 0 0 10 4-4cylo.dat
  [1,16,0,0,0,10,0,0,0,7,0,0,0,10, ldraw_lib__4_4cylo()],
];
module ldraw_lib__s__98138s02(step=0, col=false, unit=2/5, alt=false, line=0.2, solid=!$preview)
    makepoly(ldraw_lib__s__98138s02(), step=step, col=col, unit=unit, alt=alt, line=line, solid=solid);
ldraw_lib__s__98138s02(line=0.2);
// file: ../p/4-4ring9.scad
use <../lib.scad>
function ldraw_lib__4_4ring9() = [
// 0 Ring  9 x 1.0
// 0 Name: 4-4ring9.dat
// 0 Author: Magnus Forsberg [MagFors]
// 0 !LDRAW_ORG Primitive UPDATE 2024-01
// 0 !LICENSE Licensed under CC BY 4.0 : see CAreadme.txt
// 
// 0 BFC CERTIFY CCW
  [0,"BFC","CERTIFY"],
  [0,"BFC","CCW"],
// 
// 0 !HISTORY 2004-04-22 [PTadmin] Official Update 2004-02
// 0 !HISTORY 2007-06-24 [PTadmin] Header formatted for Contributor Agreement
// 0 !HISTORY 2008-07-01 [PTadmin] Official Update 2008-01
// 0 !HISTORY 2024-01-04 [MagFors] Complete regeneration, original by jriley
// 0 !HISTORY 2024-01-29 [OrionP] Official Update 2024-01
// 
// 4 16 10 0 0 9.239 0 3.827 8.3151 0 3.4443 9 0 0
  [4,16,10,0,0,9.239,0,3.827,8.3151,0,3.4443,9,0,0],
// 4 16 9.239 0 3.827 7.071 0 7.071 6.3639 0 6.3639 8.3151 0 3.4443
  [4,16,9.239,0,3.827,7.071,0,7.071,6.3639,0,6.3639,8.3151,0,3.4443],
// 4 16 7.071 0 7.071 3.827 0 9.239 3.4443 0 8.3151 6.3639 0 6.3639
  [4,16,7.071,0,7.071,3.827,0,9.239,3.4443,0,8.3151,6.3639,0,6.3639],
// 4 16 3.827 0 9.239 0 0 10 0 0 9 3.4443 0 8.3151
  [4,16,3.827,0,9.239,0,0,10,0,0,9,3.4443,0,8.3151],
// 4 16 0 0 10 -3.827 0 9.239 -3.4443 0 8.3151 0 0 9
  [4,16,0,0,10,-3.827,0,9.239,-3.4443,0,8.3151,0,0,9],
// 4 16 -3.827 0 9.239 -7.071 0 7.071 -6.3639 0 6.3639 -3.4443 0 8.3151
  [4,16,-3.827,0,9.239,-7.071,0,7.071,-6.3639,0,6.3639,-3.4443,0,8.3151],
// 4 16 -7.071 0 7.071 -9.239 0 3.827 -8.3151 0 3.4443 -6.3639 0 6.3639
  [4,16,-7.071,0,7.071,-9.239,0,3.827,-8.3151,0,3.4443,-6.3639,0,6.3639],
// 4 16 -9.239 0 3.827 -10 0 0 -9 0 0 -8.3151 0 3.4443
  [4,16,-9.239,0,3.827,-10,0,0,-9,0,0,-8.3151,0,3.4443],
// 4 16 -10 0 0 -9.239 0 -3.827 -8.3151 0 -3.4443 -9 0 0
  [4,16,-10,0,0,-9.239,0,-3.827,-8.3151,0,-3.4443,-9,0,0],
// 4 16 -9.239 0 -3.827 -7.071 0 -7.071 -6.3639 0 -6.3639 -8.3151 0 -3.4443
  [4,16,-9.239,0,-3.827,-7.071,0,-7.071,-6.3639,0,-6.3639,-8.3151,0,-3.4443],
// 4 16 -7.071 0 -7.071 -3.827 0 -9.239 -3.4443 0 -8.3151 -6.3639 0 -6.3639
  [4,16,-7.071,0,-7.071,-3.827,0,-9.239,-3.4443,0,-8.3151,-6.3639,0,-6.3639],
// 4 16 -3.827 0 -9.239 0 0 -10 0 0 -9 -3.4443 0 -8.3151
  [4,16,-3.827,0,-9.239,0,0,-10,0,0,-9,-3.4443,0,-8.3151],
// 4 16 0 0 -10 3.827 0 -9.239 3.4443 0 -8.3151 0 0 -9
  [4,16,0,0,-10,3.827,0,-9.239,3.4443,0,-8.3151,0,0,-9],
// 4 16 3.827 0 -9.239 7.071 0 -7.071 6.3639 0 -6.3639 3.4443 0 -8.3151
  [4,16,3.827,0,-9.239,7.071,0,-7.071,6.3639,0,-6.3639,3.4443,0,-8.3151],
// 4 16 7.071 0 -7.071 9.239 0 -3.827 8.3151 0 -3.4443 6.3639 0 -6.3639
  [4,16,7.071,0,-7.071,9.239,0,-3.827,8.3151,0,-3.4443,6.3639,0,-6.3639],
// 4 16 9.239 0 -3.827 10 0 0 9 0 0 8.3151 0 -3.4443
  [4,16,9.239,0,-3.827,10,0,0,9,0,0,8.3151,0,-3.4443],
// 0 // Build by LDPartEditor (PrimGen 2.X)
];
module ldraw_lib__4_4ring9(step=0, col=false, unit=2/5, alt=false, line=0.2, solid=!$preview)
    makepoly(ldraw_lib__4_4ring9(), step=step, col=col, unit=unit, alt=alt, line=line, solid=solid);
ldraw_lib__4_4ring9(line=0.2);
// file: ../p/1-16chrd.scad
use <../lib.scad>
use <empty.scad>
function ldraw_lib__1_16chrd() = [
// 0 Chord 0.0625
// 0 Name: 1-16chrd.dat
// 0 Author: Philippe Hurbain [Philo]
// 0 !LDRAW_ORG Primitive UPDATE 2015-01
// 0 !LICENSE Licensed under CC BY 4.0 : see CAreadme.txt
// 
// 0 BFC CERTIFY CCW
  [0,"BFC","CERTIFY"],
  [0,"BFC","CCW"],
// 
// 0 !HISTORY 2015-10-11 [PTadmin] Official Update 2015-01
// 
// 
// 0 // This file is intentionally empty because at the current \P resolution,
// 0 // an 1-16chrd is actually empty. However, this file still is present
// 0 // to allow tools to do primitives substition and fill in a real chrd here,
// 0 // or, if desired, to substitute this with the hi-res 48\1-16chrd.
// 
// 0 // This file is based on an idea by Darats at http://forums.ldraw.org/read.php?19,14500,14500#msg-14500
// 
// 1 16 0 0 0 1 0 0 0 1 0 0 0 1 empty.dat
  [1,16,0,0,0,1,0,0,0,1,0,0,0,1, ldraw_lib__empty()],
];
module ldraw_lib__1_16chrd(step=0, col=false, unit=2/5, alt=false, line=0.2, solid=!$preview)
    makepoly(ldraw_lib__1_16chrd(), step=step, col=col, unit=unit, alt=alt, line=line, solid=solid);
ldraw_lib__1_16chrd(line=0.2);
// file: s/98138s01.scad
use <../../lib.scad>
use <../../p/4-4ring9.scad>
use <98138s02.scad>
function ldraw_lib__s__98138s01() = [
// 0 ~Tile  1 x  1 Round with Groove with Partial Top Face
// 0 Name: s\98138s01.dat
// 0 Author: Magnus Forsberg [MagFors]
// 0 !LDRAW_ORG Subpart UPDATE 2020-01
// 0 !LICENSE Licensed under CC BY 4.0 : see CAreadme.txt
// 
// 0 BFC CERTIFY CCW
  [0,"BFC","CERTIFY"],
  [0,"BFC","CCW"],
// 
// 0 !HISTORY 2011-12-29 [PTadmin] Official Update 2011-02
// 0 !HISTORY 2016-06-17 [MagFors] Reduced the rounded edge to 0.5 ldu
// 0 !HISTORY 2016-12-31 [PTadmin] Official Update 2016-01
// 0 !HISTORY 2019-06-17 [MagFors] Removed the rounded edge
// 0 !HISTORY 2019-07-19 [MagFors] Subfiled without top surface
// 0 !HISTORY 2020-06-28 [PTadmin] Official Update 2020-01
// 
// 
// 1 16 0 0 0 1 0 0 0 1 0 0 0 1 s\98138s02.dat
  [1,16,0,0,0,1,0,0,0,1,0,0,0,1, ldraw_lib__s__98138s02()],
// 1 16 0 0 0 1 0 0 0 1 0 0 0 1 4-4ring9.dat
  [1,16,0,0,0,1,0,0,0,1,0,0,0,1, ldraw_lib__4_4ring9()],
];
module ldraw_lib__s__98138s01(step=0, col=false, unit=2/5, alt=false, line=0.2, solid=!$preview)
    makepoly(ldraw_lib__s__98138s01(), step=step, col=col, unit=unit, alt=alt, line=line, solid=solid);
ldraw_lib__s__98138s01(line=0.2);
// file: ../p/4-4ering.scad
use <../lib.scad>
use <1-16chrd.scad>
function ldraw_lib__4_4ering() = [
// 0 Adapter Ring Triangles to Normal 1.0
// 0 Name: 4-4ering.dat
// 0 Author: Philippe Hurbain [Philo]
// 0 !LDRAW_ORG Primitive UPDATE 2015-01
// 0 !LICENSE Licensed under CC BY 4.0 : see CAreadme.txt
// 
// 0 BFC CERTIFY CCW
  [0,"BFC","CERTIFY"],
  [0,"BFC","CCW"],
// 
// 0 !HISTORY 2015-10-11 [PTadmin] Official Update 2015-01
// 
// 
// 0 // This file uses 1-16chrd (actually empty). It allows
// 0 // tools to do primitives substition and fill in a ring of chrd here,
// 0 // or, if desired, to substitute this with the hi-res 48\1-16chrd.
// 0 // This file is based on an idea by Darats at http://forums.ldraw.org/read.php?19,14500,14500#msg-14500
// 
// 1 16 0 0 0 1 0 0 0 1 0 0 0 1 1-16chrd.dat
  [1,16,0,0,0,1,0,0,0,1,0,0,0,1, ldraw_lib__1_16chrd()],
// 1 16 0 0 0 0.92388 0 0.38268 0 1 0 -0.38268 0 0.92388 1-16chrd.dat
  [1,16,0,0,0,0.92388,0,0.38268,0,1,0,-0.38268,0,0.92388, ldraw_lib__1_16chrd()],
// 1 16 0 0 0 0.70711 0 0.70711 0 1 0 -0.70711 0 0.70711 1-16chrd.dat
  [1,16,0,0,0,0.70711,0,0.70711,0,1,0,-0.70711,0,0.70711, ldraw_lib__1_16chrd()],
// 1 16 0 0 0 0.38268 0 0.92388 0 1 0 -0.92388 0 0.38268 1-16chrd.dat
  [1,16,0,0,0,0.38268,0,0.92388,0,1,0,-0.92388,0,0.38268, ldraw_lib__1_16chrd()],
// 1 16 0 0 0 0 0 1 0 1 0 -1 0 0 1-16chrd.dat
  [1,16,0,0,0,0,0,1,0,1,0,-1,0,0, ldraw_lib__1_16chrd()],
// 1 16 0 0 0 -0.38268 0 0.92388 0 1 0 -0.92388 0 -0.38268 1-16chrd.dat
  [1,16,0,0,0,-0.38268,0,0.92388,0,1,0,-0.92388,0,-0.38268, ldraw_lib__1_16chrd()],
// 1 16 0 0 0 -0.70711 0 0.70711 0 1 0 -0.70711 0 -0.70711 1-16chrd.dat
  [1,16,0,0,0,-0.70711,0,0.70711,0,1,0,-0.70711,0,-0.70711, ldraw_lib__1_16chrd()],
// 1 16 0 0 0 -0.92388 0 0.38268 0 1 0 -0.38268 0 -0.92388 1-16chrd.dat
  [1,16,0,0,0,-0.92388,0,0.38268,0,1,0,-0.38268,0,-0.92388, ldraw_lib__1_16chrd()],
// 1 16 0 0 0 0 0 -1 0 1 0 1 0 0 1-16chrd.dat
  [1,16,0,0,0,0,0,-1,0,1,0,1,0,0, ldraw_lib__1_16chrd()],
// 1 16 0 0 0 0.38268 0 -0.92388 0 1 0 0.92388 0 0.38268 1-16chrd.dat
  [1,16,0,0,0,0.38268,0,-0.92388,0,1,0,0.92388,0,0.38268, ldraw_lib__1_16chrd()],
// 1 16 0 0 0 0.70711 0 -0.70711 0 1 0 0.70711 0 0.70711 1-16chrd.dat
  [1,16,0,0,0,0.70711,0,-0.70711,0,1,0,0.70711,0,0.70711, ldraw_lib__1_16chrd()],
// 1 16 0 0 0 0.92388 0 -0.38268 0 1 0 0.38268 0 0.92388 1-16chrd.dat
  [1,16,0,0,0,0.92388,0,-0.38268,0,1,0,0.38268,0,0.92388, ldraw_lib__1_16chrd()],
// 1 16 0 0 0 -1 0 0 0 1 0 0 0 -1 1-16chrd.dat
  [1,16,0,0,0,-1,0,0,0,1,0,0,0,-1, ldraw_lib__1_16chrd()],
// 1 16 0 0 0 -0.92388 0 -0.38268 0 1 0 0.38268 0 -0.92388 1-16chrd.dat
  [1,16,0,0,0,-0.92388,0,-0.38268,0,1,0,0.38268,0,-0.92388, ldraw_lib__1_16chrd()],
// 1 16 0 0 0 -0.70711 0 -0.70711 0 1 0 0.70711 0 -0.70711 1-16chrd.dat
  [1,16,0,0,0,-0.70711,0,-0.70711,0,1,0,0.70711,0,-0.70711, ldraw_lib__1_16chrd()],
// 1 16 0 0 0 -0.38268 0 -0.92388 0 1 0 0.92388 0 -0.38268 1-16chrd.dat
  [1,16,0,0,0,-0.38268,0,-0.92388,0,1,0,0.92388,0,-0.38268, ldraw_lib__1_16chrd()],
];
module ldraw_lib__4_4ering(step=0, col=false, unit=2/5, alt=false, line=0.2, solid=!$preview)
    makepoly(ldraw_lib__4_4ering(), step=step, col=col, unit=unit, alt=alt, line=line, solid=solid);
ldraw_lib__4_4ering(line=0.2);
// main file
use <../lib.scad>
use <../p/4-4ering.scad>
use <s/98138s01.scad>
function ldraw_lib__98138p2s() = [
// 0 Tile  1 x  1 Round with Super Mario Pixelated Coin Pattern
// 0 Name: 98138p2s.dat
// 0 Author: Florent Faramond [Makou]
// 0 !LDRAW_ORG Part UPDATE 2025-01
// 0 !LICENSE Licensed under CC BY 4.0 : see CAreadme.txt
// 
// 0 BFC CERTIFY CCW
  [0,"BFC","CERTIFY"],
  [0,"BFC","CCW"],
// 
// 0 !KEYWORDS Bricklink 98138pb172, Rebrickable 98138pr9995, Set 71374
// 
// 0 !HISTORY 2024-05-22 [Cheenzo] Removed unnecessary vertices
// 0 !HISTORY 2024-12-31 [ejboer] Removed vertice and T-junction
// 0 !HISTORY 2025-01-20 [OrionP] Official Update 2025-01
// 
// 1 16 0 0 0 1 0 0 0 1 0 0 0 1 s\98138s01.dat
  [1,16,0,0,0,1,0,0,0,1,0,0,0,1, ldraw_lib__s__98138s01()],
// 1 16 0 0 0 9 0 0 0 1 0 0 0 9 4-4ering.dat
  [1,16,0,0,0,9,0,0,0,1,0,0,0,9, ldraw_lib__4_4ering()],
// 
// 4 6 0 0 5.5 -2 0 5.5 -2 0 4.5 0 0 4.5
  [4,6,0,0,5.5,-2,0,5.5,-2,0,4.5,0,0,4.5],
// 4 6 -2 0 -3.5 -2 0 4.5 -3 0 4.5 -3 0 -3.5
  [4,6,-2,0,-3.5,-2,0,4.5,-3,0,4.5,-3,0,-3.5],
// 3 0 2 0 6.5 1 0 7.5 1 0 6.5
  [3,0,2,0,6.5,1,0,7.5,1,0,6.5],
// 4 0 3 0 6.5 3 0 7.5 1 0 7.5 2 0 6.5
  [4,0,3,0,6.5,3,0,7.5,1,0,7.5,2,0,6.5],
// 4 0 3 0 3.5 3 0 6.5 2 0 6.5 2 0 3.5
  [4,0,3,0,3.5,3,0,6.5,2,0,6.5,2,0,3.5],
// 4 0 4 0 3.5 4 0 6.5 3 0 6.5 3 0 3.5
  [4,0,4,0,3.5,4,0,6.5,3,0,6.5,3,0,3.5],
// 4 0 4 0 -4.5 4 0 3.5 3 0 3.5 3 0 -4.5
  [4,0,4,0,-4.5,4,0,3.5,3,0,3.5,3,0,-4.5],
// 4 0 5 0 -4.5 5 0 3.5 4 0 3.5 4 0 -4.5
  [4,0,5,0,-4.5,5,0,3.5,4,0,3.5,4,0,-4.5],
// 4 0 1 0 -4.5 1 0 3.5 0 0 3.5 0 0 -4.5
  [4,0,1,0,-4.5,1,0,3.5,0,0,3.5,0,0,-4.5],
// 4 0 3 0 -6.5 3 0 -4.5 2 0 -4.5 2 0 -6.5
  [4,0,3,0,-6.5,3,0,-4.5,2,0,-4.5,2,0,-6.5],
// 4 0 4 0 -6.5 4 0 -4.5 3 0 -4.5 3 0 -6.5
  [4,0,4,0,-6.5,4,0,-4.5,3,0,-4.5,3,0,-6.5],
// 4 0 0 0 -5.5 0 0 -4.5 -2 0 -4.5 -2 0 -5.5
  [4,0,0,0,-5.5,0,0,-4.5,-2,0,-4.5,-2,0,-5.5],
// 3 0 2 0 -6.5 1 0 -6.5 1 0 -7.5
  [3,0,2,0,-6.5,1,0,-6.5,1,0,-7.5],
// 4 0 3 0 -6.5 2 0 -6.5 1 0 -7.5 3 0 -7.5
  [4,0,3,0,-6.5,2,0,-6.5,1,0,-7.5,3,0,-7.5],
// 4 78 1 0 6.5 1 0 7.5 -3 0 7.5 -3 0 6.5
  [4,78,1,0,6.5,1,0,7.5,-3,0,7.5,-3,0,6.5],
// 4 78 0 0 5.5 1 0 6.5 -3 0 6.5 -2 0 5.5
  [4,78,0,0,5.5,1,0,6.5,-3,0,6.5,-2,0,5.5],
// 4 78 -3 0 4.5 -3 0 6.5 -4 0 6.5 -4 0 4.5
  [4,78,-3,0,4.5,-3,0,6.5,-4,0,6.5,-4,0,4.5],
// 4 78 -2 0 4.5 -2 0 5.5 -3 0 6.5 -3 0 4.5
  [4,78,-2,0,4.5,-2,0,5.5,-3,0,6.5,-3,0,4.5],
// 4 78 1 0 3.5 1 0 6.5 0 0 5.5 0 0 4.5
  [4,78,1,0,3.5,1,0,6.5,0,0,5.5,0,0,4.5],
// 4 78 2 0 3.5 2 0 6.5 1 0 6.5 1 0 3.5
  [4,78,2,0,3.5,2,0,6.5,1,0,6.5,1,0,3.5],
// 4 78 -2 0 4.5 0 0 3.5 1 0 3.5 0 0 4.5
  [4,78,-2,0,4.5,0,0,3.5,1,0,3.5,0,0,4.5],
// 4 78 2 0 -4.5 2 0 3.5 1 0 3.5 1 0 -4.5
  [4,78,2,0,-4.5,2,0,3.5,1,0,3.5,1,0,-4.5],
// 4 78 3 0 -4.5 3 0 3.5 2 0 3.5 2 0 -4.5
  [4,78,3,0,-4.5,3,0,3.5,2,0,3.5,2,0,-4.5],
// 4 78 -4 0 -4.5 -4 0 4.5 -5 0 4.5 -5 0 -4.5
  [4,78,-4,0,-4.5,-4,0,4.5,-5,0,4.5,-5,0,-4.5],
// 4 78 -3 0 -3.5 -3 0 4.5 -4 0 4.5 -4 0 -4.5
  [4,78,-3,0,-3.5,-3,0,4.5,-4,0,4.5,-4,0,-4.5],
// 3 78 0 0 -4.5 -2 0 -3.5 -2 0 -4.5
  [3,78,0,0,-4.5,-2,0,-3.5,-2,0,-4.5],
// 4 78 -2 0 -4.5 -2 0 -3.5 -3 0 -3.5 -4 0 -4.5
  [4,78,-2,0,-4.5,-2,0,-3.5,-3,0,-3.5,-4,0,-4.5],
// 4 78 1 0 -6.5 1 0 -4.5 0 0 -4.5 0 0 -5.5
  [4,78,1,0,-6.5,1,0,-4.5,0,0,-4.5,0,0,-5.5],
// 4 78 2 0 -6.5 2 0 -4.5 1 0 -4.5 1 0 -6.5
  [4,78,2,0,-6.5,2,0,-4.5,1,0,-4.5,1,0,-6.5],
// 4 78 -2 0 -5.5 -2 0 -4.5 -4 0 -4.5 -3 0 -6.5
  [4,78,-2,0,-5.5,-2,0,-4.5,-4,0,-4.5,-3,0,-6.5],
// 3 78 -3 0 -6.5 -4 0 -4.5 -4 0 -6.5
  [3,78,-3,0,-6.5,-4,0,-4.5,-4,0,-6.5],
// 4 78 1 0 -6.5 0 0 -5.5 -2 0 -5.5 -3 0 -6.5
  [4,78,1,0,-6.5,0,0,-5.5,-2,0,-5.5,-3,0,-6.5],
// 4 78 1 0 -7.5 1 0 -6.5 -3 0 -6.5 -3 0 -7.5
  [4,78,1,0,-7.5,1,0,-6.5,-3,0,-6.5,-3,0,-7.5],
// 4 16 0 0 9 1 0 7.5 3 0 7.5 3.4443 0 8.3151
  [4,16,0,0,9,1,0,7.5,3,0,7.5,3.4443,0,8.3151],
// 4 16 6.3639 0 6.3639 3.4443 0 8.3151 3 0 7.5 4 0 6.5
  [4,16,6.3639,0,6.3639,3.4443,0,8.3151,3,0,7.5,4,0,6.5],
// 3 16 3 0 7.5 3 0 6.5 4 0 6.5
  [3,16,3,0,7.5,3,0,6.5,4,0,6.5],
// 4 16 4 0 6.5 4 0 3.5 5 0 3.5 6.3639 0 6.3639
  [4,16,4,0,6.5,4,0,3.5,5,0,3.5,6.3639,0,6.3639],
// 4 16 6.3639 0 6.3639 5 0 3.5 9 0 0 8.3151 0 3.4443
  [4,16,6.3639,0,6.3639,5,0,3.5,9,0,0,8.3151,0,3.4443],
// 4 16 9 0 0 5 0 3.5 5 0 -4.5 8.3151 0 -3.4443
  [4,16,9,0,0,5,0,3.5,5,0,-4.5,8.3151,0,-3.4443],
// 3 16 8.3151 0 -3.4443 5 0 -4.5 6.3639 0 -6.3639
  [3,16,8.3151,0,-3.4443,5,0,-4.5,6.3639,0,-6.3639],
// 4 16 6.3639 0 -6.3639 5 0 -4.5 4 0 -4.5 4 0 -6.5
  [4,16,6.3639,0,-6.3639,5,0,-4.5,4,0,-4.5,4,0,-6.5],
// 4 16 4 0 -6.5 3 0 -6.5 3 0 -7.5 3.4443 0 -8.3151
  [4,16,4,0,-6.5,3,0,-6.5,3,0,-7.5,3.4443,0,-8.3151],
// 3 16 6.3639 0 -6.3639 4 0 -6.5 3.4443 0 -8.3151
  [3,16,6.3639,0,-6.3639,4,0,-6.5,3.4443,0,-8.3151],
// 4 16 3 0 -7.5 1 0 -7.5 0 0 -9 3.4443 0 -8.3151
  [4,16,3,0,-7.5,1,0,-7.5,0,0,-9,3.4443,0,-8.3151],
// 4 16 -3.4443 0 -8.3151 0 0 -9 1 0 -7.5 -3 0 -7.5
  [4,16,-3.4443,0,-8.3151,0,0,-9,1,0,-7.5,-3,0,-7.5],
// 4 16 -3 0 -7.5 -3 0 -6.5 -4 0 -6.5 -3.4443 0 -8.3151
  [4,16,-3,0,-7.5,-3,0,-6.5,-4,0,-6.5,-3.4443,0,-8.3151],
// 3 16 -6.3639 0 -6.3639 -3.4443 0 -8.3151 -4 0 -6.5
  [3,16,-6.3639,0,-6.3639,-3.4443,0,-8.3151,-4,0,-6.5],
// 4 16 -6.3639 0 -6.3639 -4 0 -6.5 -4 0 -4.5 -5 0 -4.5
  [4,16,-6.3639,0,-6.3639,-4,0,-6.5,-4,0,-4.5,-5,0,-4.5],
// 4 16 -6.3639 0 -6.3639 -5 0 -4.5 -9 0 0 -8.3151 0 -3.4443
  [4,16,-6.3639,0,-6.3639,-5,0,-4.5,-9,0,0,-8.3151,0,-3.4443],
// 4 16 -5 0 -4.5 -5 0 4.5 -8.3151 0 3.4443 -9 0 0
  [4,16,-5,0,-4.5,-5,0,4.5,-8.3151,0,3.4443,-9,0,0],
// 3 16 -8.3151 0 3.4443 -5 0 4.5 -6.3639 0 6.3639
  [3,16,-8.3151,0,3.4443,-5,0,4.5,-6.3639,0,6.3639],
// 4 16 -6.3639 0 6.3639 -5 0 4.5 -4 0 4.5 -4 0 6.5
  [4,16,-6.3639,0,6.3639,-5,0,4.5,-4,0,4.5,-4,0,6.5],
// 4 16 -4 0 6.5 -3 0 6.5 -3 0 7.5 -3.4443 0 8.3151
  [4,16,-4,0,6.5,-3,0,6.5,-3,0,7.5,-3.4443,0,8.3151],
// 3 16 -4 0 6.5 -3.4443 0 8.3151 -6.3639 0 6.3639
  [3,16,-4,0,6.5,-3.4443,0,8.3151,-6.3639,0,6.3639],
// 4 16 1 0 7.5 0 0 9 -3.4443 0 8.3151 -3 0 7.5
  [4,16,1,0,7.5,0,0,9,-3.4443,0,8.3151,-3,0,7.5],
// 4 78 0 0 -4.5 0 0 3.5 -2 0 4.5 -2 0 -3.5
  [4,78,0,0,-4.5,0,0,3.5,-2,0,4.5,-2,0,-3.5],
];
module ldraw_lib__98138p2s(step=0, col=false, unit=2/5, alt=false, line=0.2, solid=!$preview)
    makepoly(ldraw_lib__98138p2s(), step=step, col=col, unit=unit, alt=alt, line=line, solid=solid);
ldraw_lib__98138p2s(line=0.2);
